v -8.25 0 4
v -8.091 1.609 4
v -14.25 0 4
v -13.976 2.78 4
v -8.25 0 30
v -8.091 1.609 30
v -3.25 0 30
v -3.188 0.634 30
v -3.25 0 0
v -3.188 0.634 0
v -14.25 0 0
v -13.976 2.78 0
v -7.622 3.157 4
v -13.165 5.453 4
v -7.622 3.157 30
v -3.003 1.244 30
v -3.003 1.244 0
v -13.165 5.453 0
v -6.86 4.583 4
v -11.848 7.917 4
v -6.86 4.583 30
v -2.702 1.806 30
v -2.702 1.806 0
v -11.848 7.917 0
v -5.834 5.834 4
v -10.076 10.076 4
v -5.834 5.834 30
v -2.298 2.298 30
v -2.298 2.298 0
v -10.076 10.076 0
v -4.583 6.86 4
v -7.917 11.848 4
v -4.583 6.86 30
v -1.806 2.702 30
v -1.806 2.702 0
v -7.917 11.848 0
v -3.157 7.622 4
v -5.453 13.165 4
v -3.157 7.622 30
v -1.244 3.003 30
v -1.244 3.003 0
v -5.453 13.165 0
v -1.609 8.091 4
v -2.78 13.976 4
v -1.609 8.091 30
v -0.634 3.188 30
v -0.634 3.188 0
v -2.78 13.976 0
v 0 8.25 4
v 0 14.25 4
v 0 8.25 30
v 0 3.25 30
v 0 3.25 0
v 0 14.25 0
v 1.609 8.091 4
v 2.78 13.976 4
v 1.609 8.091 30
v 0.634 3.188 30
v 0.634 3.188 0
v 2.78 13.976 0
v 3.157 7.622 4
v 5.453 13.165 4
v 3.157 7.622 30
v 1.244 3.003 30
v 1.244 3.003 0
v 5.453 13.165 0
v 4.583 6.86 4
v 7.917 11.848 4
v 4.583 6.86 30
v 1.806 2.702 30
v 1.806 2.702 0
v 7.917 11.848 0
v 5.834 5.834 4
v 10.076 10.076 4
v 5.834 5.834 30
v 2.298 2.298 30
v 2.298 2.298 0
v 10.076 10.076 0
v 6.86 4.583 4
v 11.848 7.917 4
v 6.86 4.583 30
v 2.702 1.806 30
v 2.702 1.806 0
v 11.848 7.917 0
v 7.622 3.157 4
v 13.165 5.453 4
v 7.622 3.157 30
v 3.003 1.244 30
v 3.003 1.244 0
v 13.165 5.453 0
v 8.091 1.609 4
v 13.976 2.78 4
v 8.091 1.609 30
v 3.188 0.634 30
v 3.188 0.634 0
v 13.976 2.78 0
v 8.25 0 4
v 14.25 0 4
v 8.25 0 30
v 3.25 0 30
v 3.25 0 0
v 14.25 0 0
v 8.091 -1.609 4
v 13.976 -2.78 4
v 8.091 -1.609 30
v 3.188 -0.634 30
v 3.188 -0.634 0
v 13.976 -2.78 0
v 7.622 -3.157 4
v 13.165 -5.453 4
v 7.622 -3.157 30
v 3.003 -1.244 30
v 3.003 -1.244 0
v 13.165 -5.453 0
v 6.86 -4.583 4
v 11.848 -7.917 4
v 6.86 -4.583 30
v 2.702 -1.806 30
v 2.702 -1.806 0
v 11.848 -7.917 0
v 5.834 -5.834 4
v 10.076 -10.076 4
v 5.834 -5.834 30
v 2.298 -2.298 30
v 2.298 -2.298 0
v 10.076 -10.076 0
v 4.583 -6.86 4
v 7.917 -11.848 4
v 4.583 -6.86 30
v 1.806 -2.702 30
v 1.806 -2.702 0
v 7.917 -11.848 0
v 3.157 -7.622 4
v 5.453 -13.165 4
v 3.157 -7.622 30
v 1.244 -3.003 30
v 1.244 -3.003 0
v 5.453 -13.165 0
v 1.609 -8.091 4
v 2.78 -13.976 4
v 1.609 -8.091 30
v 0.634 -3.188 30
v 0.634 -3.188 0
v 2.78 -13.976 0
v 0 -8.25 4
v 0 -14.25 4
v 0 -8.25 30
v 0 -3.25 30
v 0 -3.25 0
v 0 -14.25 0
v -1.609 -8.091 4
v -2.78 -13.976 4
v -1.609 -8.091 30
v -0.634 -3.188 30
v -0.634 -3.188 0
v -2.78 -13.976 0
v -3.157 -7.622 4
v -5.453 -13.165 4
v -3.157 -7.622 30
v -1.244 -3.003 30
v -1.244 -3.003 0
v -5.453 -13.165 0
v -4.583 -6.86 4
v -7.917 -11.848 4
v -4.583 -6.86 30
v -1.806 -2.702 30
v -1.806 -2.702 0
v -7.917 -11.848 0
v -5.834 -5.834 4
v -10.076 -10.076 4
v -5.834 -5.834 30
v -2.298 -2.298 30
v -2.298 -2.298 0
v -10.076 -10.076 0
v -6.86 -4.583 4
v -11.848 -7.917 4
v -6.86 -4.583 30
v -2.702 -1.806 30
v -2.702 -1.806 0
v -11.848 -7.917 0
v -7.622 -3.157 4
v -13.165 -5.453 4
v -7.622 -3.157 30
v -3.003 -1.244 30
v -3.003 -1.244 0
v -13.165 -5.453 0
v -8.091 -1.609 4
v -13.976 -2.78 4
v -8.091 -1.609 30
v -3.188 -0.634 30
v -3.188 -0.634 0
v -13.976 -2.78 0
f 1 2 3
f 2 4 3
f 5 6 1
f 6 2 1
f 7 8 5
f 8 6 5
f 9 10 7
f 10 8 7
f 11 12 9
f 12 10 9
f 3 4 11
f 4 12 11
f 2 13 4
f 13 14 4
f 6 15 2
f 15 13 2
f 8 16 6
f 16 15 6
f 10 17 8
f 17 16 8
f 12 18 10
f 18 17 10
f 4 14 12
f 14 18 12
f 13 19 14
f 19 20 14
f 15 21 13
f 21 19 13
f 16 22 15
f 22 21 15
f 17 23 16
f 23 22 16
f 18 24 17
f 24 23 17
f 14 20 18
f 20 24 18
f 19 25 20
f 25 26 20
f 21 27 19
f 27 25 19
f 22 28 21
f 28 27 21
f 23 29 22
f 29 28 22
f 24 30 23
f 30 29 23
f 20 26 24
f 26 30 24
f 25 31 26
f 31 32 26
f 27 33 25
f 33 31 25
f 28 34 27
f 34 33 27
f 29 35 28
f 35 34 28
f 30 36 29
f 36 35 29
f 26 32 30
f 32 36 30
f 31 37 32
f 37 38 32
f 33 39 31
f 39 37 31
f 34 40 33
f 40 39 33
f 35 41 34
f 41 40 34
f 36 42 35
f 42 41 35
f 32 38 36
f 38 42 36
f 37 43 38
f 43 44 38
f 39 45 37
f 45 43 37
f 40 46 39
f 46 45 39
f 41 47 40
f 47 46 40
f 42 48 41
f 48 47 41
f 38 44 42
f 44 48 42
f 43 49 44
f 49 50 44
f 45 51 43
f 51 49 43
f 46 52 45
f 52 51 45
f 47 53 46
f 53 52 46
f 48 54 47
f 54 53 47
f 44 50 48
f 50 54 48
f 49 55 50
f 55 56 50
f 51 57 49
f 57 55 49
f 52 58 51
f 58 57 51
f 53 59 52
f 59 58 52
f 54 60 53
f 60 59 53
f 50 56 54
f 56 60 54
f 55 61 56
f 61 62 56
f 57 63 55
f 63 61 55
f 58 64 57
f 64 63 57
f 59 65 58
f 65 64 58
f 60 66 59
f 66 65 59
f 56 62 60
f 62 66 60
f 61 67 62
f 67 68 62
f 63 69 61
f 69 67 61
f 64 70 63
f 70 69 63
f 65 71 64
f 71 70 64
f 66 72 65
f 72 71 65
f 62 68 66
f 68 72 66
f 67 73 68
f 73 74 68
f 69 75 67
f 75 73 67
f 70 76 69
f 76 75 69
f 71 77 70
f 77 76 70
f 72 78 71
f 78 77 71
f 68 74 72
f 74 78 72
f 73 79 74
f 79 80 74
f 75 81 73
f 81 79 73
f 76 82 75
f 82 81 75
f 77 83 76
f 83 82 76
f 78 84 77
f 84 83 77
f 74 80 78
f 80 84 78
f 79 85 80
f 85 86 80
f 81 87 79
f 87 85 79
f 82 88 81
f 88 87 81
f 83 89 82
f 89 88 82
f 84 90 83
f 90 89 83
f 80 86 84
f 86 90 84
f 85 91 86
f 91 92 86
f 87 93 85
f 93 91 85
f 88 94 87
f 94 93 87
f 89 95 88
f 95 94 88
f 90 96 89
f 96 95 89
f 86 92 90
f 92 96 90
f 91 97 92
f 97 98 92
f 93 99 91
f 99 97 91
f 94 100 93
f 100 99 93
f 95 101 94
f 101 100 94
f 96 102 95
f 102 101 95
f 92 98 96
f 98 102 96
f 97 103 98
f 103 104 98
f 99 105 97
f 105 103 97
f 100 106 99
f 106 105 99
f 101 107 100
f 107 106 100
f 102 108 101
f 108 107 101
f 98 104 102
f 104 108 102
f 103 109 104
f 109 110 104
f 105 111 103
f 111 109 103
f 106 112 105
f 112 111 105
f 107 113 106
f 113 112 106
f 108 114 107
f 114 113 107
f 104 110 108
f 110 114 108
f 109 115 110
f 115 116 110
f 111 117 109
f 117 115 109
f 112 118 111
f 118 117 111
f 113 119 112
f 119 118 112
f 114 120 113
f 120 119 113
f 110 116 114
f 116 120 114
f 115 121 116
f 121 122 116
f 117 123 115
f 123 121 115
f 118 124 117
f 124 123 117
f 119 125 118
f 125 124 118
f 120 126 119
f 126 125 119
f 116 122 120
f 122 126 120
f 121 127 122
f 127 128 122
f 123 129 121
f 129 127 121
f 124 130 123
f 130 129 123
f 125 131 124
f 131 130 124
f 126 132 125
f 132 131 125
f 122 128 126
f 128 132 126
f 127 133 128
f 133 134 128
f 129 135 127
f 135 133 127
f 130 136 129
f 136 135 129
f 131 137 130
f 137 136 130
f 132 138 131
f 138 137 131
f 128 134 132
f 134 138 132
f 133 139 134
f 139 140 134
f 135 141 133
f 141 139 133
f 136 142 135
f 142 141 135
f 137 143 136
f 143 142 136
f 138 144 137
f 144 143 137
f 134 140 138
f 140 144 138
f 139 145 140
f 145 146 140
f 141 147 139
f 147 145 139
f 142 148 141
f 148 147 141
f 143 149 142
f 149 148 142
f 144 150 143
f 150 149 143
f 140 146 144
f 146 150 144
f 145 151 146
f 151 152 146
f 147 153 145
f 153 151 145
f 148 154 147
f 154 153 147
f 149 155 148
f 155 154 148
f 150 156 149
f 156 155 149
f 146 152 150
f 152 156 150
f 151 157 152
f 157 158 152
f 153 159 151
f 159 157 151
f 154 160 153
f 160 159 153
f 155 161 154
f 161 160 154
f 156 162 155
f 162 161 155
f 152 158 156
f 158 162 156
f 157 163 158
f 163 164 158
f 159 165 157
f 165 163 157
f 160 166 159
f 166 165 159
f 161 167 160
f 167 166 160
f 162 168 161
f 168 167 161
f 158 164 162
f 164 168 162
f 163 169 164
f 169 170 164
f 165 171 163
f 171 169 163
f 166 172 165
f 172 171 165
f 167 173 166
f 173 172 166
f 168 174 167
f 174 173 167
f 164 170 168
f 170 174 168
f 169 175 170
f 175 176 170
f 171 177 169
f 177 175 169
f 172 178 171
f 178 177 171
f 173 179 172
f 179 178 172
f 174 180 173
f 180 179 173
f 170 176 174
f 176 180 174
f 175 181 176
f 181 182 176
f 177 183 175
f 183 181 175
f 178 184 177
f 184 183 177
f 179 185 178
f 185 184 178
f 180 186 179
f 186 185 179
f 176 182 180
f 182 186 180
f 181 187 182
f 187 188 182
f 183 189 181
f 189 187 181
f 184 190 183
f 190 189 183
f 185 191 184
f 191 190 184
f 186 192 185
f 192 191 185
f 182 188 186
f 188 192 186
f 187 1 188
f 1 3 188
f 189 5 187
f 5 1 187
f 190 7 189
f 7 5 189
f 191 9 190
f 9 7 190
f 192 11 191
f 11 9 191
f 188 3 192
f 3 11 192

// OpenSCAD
$fn = 32;

// ----------------------------------------------------------------------
// Profiled standoff: flanged spacer, 30 mm long, bore 6.5 mm
// ----------------------------------------------------------------------

// --- parameters (mm) ---
revolve_angle = 360;      // full turn around the Z axis
profile_points = 6;       // points of the closed outline

profile = [[3.25, 0], [14.25, 0], [14.25, 4], [8.25, 4], [8.25, 30], [3.25, 30]];  // single closed polygon, 6 points, counter clockwise

// --- the one profile operation ---
rotate_extrude(angle = revolve_angle) polygon(points = profile);
